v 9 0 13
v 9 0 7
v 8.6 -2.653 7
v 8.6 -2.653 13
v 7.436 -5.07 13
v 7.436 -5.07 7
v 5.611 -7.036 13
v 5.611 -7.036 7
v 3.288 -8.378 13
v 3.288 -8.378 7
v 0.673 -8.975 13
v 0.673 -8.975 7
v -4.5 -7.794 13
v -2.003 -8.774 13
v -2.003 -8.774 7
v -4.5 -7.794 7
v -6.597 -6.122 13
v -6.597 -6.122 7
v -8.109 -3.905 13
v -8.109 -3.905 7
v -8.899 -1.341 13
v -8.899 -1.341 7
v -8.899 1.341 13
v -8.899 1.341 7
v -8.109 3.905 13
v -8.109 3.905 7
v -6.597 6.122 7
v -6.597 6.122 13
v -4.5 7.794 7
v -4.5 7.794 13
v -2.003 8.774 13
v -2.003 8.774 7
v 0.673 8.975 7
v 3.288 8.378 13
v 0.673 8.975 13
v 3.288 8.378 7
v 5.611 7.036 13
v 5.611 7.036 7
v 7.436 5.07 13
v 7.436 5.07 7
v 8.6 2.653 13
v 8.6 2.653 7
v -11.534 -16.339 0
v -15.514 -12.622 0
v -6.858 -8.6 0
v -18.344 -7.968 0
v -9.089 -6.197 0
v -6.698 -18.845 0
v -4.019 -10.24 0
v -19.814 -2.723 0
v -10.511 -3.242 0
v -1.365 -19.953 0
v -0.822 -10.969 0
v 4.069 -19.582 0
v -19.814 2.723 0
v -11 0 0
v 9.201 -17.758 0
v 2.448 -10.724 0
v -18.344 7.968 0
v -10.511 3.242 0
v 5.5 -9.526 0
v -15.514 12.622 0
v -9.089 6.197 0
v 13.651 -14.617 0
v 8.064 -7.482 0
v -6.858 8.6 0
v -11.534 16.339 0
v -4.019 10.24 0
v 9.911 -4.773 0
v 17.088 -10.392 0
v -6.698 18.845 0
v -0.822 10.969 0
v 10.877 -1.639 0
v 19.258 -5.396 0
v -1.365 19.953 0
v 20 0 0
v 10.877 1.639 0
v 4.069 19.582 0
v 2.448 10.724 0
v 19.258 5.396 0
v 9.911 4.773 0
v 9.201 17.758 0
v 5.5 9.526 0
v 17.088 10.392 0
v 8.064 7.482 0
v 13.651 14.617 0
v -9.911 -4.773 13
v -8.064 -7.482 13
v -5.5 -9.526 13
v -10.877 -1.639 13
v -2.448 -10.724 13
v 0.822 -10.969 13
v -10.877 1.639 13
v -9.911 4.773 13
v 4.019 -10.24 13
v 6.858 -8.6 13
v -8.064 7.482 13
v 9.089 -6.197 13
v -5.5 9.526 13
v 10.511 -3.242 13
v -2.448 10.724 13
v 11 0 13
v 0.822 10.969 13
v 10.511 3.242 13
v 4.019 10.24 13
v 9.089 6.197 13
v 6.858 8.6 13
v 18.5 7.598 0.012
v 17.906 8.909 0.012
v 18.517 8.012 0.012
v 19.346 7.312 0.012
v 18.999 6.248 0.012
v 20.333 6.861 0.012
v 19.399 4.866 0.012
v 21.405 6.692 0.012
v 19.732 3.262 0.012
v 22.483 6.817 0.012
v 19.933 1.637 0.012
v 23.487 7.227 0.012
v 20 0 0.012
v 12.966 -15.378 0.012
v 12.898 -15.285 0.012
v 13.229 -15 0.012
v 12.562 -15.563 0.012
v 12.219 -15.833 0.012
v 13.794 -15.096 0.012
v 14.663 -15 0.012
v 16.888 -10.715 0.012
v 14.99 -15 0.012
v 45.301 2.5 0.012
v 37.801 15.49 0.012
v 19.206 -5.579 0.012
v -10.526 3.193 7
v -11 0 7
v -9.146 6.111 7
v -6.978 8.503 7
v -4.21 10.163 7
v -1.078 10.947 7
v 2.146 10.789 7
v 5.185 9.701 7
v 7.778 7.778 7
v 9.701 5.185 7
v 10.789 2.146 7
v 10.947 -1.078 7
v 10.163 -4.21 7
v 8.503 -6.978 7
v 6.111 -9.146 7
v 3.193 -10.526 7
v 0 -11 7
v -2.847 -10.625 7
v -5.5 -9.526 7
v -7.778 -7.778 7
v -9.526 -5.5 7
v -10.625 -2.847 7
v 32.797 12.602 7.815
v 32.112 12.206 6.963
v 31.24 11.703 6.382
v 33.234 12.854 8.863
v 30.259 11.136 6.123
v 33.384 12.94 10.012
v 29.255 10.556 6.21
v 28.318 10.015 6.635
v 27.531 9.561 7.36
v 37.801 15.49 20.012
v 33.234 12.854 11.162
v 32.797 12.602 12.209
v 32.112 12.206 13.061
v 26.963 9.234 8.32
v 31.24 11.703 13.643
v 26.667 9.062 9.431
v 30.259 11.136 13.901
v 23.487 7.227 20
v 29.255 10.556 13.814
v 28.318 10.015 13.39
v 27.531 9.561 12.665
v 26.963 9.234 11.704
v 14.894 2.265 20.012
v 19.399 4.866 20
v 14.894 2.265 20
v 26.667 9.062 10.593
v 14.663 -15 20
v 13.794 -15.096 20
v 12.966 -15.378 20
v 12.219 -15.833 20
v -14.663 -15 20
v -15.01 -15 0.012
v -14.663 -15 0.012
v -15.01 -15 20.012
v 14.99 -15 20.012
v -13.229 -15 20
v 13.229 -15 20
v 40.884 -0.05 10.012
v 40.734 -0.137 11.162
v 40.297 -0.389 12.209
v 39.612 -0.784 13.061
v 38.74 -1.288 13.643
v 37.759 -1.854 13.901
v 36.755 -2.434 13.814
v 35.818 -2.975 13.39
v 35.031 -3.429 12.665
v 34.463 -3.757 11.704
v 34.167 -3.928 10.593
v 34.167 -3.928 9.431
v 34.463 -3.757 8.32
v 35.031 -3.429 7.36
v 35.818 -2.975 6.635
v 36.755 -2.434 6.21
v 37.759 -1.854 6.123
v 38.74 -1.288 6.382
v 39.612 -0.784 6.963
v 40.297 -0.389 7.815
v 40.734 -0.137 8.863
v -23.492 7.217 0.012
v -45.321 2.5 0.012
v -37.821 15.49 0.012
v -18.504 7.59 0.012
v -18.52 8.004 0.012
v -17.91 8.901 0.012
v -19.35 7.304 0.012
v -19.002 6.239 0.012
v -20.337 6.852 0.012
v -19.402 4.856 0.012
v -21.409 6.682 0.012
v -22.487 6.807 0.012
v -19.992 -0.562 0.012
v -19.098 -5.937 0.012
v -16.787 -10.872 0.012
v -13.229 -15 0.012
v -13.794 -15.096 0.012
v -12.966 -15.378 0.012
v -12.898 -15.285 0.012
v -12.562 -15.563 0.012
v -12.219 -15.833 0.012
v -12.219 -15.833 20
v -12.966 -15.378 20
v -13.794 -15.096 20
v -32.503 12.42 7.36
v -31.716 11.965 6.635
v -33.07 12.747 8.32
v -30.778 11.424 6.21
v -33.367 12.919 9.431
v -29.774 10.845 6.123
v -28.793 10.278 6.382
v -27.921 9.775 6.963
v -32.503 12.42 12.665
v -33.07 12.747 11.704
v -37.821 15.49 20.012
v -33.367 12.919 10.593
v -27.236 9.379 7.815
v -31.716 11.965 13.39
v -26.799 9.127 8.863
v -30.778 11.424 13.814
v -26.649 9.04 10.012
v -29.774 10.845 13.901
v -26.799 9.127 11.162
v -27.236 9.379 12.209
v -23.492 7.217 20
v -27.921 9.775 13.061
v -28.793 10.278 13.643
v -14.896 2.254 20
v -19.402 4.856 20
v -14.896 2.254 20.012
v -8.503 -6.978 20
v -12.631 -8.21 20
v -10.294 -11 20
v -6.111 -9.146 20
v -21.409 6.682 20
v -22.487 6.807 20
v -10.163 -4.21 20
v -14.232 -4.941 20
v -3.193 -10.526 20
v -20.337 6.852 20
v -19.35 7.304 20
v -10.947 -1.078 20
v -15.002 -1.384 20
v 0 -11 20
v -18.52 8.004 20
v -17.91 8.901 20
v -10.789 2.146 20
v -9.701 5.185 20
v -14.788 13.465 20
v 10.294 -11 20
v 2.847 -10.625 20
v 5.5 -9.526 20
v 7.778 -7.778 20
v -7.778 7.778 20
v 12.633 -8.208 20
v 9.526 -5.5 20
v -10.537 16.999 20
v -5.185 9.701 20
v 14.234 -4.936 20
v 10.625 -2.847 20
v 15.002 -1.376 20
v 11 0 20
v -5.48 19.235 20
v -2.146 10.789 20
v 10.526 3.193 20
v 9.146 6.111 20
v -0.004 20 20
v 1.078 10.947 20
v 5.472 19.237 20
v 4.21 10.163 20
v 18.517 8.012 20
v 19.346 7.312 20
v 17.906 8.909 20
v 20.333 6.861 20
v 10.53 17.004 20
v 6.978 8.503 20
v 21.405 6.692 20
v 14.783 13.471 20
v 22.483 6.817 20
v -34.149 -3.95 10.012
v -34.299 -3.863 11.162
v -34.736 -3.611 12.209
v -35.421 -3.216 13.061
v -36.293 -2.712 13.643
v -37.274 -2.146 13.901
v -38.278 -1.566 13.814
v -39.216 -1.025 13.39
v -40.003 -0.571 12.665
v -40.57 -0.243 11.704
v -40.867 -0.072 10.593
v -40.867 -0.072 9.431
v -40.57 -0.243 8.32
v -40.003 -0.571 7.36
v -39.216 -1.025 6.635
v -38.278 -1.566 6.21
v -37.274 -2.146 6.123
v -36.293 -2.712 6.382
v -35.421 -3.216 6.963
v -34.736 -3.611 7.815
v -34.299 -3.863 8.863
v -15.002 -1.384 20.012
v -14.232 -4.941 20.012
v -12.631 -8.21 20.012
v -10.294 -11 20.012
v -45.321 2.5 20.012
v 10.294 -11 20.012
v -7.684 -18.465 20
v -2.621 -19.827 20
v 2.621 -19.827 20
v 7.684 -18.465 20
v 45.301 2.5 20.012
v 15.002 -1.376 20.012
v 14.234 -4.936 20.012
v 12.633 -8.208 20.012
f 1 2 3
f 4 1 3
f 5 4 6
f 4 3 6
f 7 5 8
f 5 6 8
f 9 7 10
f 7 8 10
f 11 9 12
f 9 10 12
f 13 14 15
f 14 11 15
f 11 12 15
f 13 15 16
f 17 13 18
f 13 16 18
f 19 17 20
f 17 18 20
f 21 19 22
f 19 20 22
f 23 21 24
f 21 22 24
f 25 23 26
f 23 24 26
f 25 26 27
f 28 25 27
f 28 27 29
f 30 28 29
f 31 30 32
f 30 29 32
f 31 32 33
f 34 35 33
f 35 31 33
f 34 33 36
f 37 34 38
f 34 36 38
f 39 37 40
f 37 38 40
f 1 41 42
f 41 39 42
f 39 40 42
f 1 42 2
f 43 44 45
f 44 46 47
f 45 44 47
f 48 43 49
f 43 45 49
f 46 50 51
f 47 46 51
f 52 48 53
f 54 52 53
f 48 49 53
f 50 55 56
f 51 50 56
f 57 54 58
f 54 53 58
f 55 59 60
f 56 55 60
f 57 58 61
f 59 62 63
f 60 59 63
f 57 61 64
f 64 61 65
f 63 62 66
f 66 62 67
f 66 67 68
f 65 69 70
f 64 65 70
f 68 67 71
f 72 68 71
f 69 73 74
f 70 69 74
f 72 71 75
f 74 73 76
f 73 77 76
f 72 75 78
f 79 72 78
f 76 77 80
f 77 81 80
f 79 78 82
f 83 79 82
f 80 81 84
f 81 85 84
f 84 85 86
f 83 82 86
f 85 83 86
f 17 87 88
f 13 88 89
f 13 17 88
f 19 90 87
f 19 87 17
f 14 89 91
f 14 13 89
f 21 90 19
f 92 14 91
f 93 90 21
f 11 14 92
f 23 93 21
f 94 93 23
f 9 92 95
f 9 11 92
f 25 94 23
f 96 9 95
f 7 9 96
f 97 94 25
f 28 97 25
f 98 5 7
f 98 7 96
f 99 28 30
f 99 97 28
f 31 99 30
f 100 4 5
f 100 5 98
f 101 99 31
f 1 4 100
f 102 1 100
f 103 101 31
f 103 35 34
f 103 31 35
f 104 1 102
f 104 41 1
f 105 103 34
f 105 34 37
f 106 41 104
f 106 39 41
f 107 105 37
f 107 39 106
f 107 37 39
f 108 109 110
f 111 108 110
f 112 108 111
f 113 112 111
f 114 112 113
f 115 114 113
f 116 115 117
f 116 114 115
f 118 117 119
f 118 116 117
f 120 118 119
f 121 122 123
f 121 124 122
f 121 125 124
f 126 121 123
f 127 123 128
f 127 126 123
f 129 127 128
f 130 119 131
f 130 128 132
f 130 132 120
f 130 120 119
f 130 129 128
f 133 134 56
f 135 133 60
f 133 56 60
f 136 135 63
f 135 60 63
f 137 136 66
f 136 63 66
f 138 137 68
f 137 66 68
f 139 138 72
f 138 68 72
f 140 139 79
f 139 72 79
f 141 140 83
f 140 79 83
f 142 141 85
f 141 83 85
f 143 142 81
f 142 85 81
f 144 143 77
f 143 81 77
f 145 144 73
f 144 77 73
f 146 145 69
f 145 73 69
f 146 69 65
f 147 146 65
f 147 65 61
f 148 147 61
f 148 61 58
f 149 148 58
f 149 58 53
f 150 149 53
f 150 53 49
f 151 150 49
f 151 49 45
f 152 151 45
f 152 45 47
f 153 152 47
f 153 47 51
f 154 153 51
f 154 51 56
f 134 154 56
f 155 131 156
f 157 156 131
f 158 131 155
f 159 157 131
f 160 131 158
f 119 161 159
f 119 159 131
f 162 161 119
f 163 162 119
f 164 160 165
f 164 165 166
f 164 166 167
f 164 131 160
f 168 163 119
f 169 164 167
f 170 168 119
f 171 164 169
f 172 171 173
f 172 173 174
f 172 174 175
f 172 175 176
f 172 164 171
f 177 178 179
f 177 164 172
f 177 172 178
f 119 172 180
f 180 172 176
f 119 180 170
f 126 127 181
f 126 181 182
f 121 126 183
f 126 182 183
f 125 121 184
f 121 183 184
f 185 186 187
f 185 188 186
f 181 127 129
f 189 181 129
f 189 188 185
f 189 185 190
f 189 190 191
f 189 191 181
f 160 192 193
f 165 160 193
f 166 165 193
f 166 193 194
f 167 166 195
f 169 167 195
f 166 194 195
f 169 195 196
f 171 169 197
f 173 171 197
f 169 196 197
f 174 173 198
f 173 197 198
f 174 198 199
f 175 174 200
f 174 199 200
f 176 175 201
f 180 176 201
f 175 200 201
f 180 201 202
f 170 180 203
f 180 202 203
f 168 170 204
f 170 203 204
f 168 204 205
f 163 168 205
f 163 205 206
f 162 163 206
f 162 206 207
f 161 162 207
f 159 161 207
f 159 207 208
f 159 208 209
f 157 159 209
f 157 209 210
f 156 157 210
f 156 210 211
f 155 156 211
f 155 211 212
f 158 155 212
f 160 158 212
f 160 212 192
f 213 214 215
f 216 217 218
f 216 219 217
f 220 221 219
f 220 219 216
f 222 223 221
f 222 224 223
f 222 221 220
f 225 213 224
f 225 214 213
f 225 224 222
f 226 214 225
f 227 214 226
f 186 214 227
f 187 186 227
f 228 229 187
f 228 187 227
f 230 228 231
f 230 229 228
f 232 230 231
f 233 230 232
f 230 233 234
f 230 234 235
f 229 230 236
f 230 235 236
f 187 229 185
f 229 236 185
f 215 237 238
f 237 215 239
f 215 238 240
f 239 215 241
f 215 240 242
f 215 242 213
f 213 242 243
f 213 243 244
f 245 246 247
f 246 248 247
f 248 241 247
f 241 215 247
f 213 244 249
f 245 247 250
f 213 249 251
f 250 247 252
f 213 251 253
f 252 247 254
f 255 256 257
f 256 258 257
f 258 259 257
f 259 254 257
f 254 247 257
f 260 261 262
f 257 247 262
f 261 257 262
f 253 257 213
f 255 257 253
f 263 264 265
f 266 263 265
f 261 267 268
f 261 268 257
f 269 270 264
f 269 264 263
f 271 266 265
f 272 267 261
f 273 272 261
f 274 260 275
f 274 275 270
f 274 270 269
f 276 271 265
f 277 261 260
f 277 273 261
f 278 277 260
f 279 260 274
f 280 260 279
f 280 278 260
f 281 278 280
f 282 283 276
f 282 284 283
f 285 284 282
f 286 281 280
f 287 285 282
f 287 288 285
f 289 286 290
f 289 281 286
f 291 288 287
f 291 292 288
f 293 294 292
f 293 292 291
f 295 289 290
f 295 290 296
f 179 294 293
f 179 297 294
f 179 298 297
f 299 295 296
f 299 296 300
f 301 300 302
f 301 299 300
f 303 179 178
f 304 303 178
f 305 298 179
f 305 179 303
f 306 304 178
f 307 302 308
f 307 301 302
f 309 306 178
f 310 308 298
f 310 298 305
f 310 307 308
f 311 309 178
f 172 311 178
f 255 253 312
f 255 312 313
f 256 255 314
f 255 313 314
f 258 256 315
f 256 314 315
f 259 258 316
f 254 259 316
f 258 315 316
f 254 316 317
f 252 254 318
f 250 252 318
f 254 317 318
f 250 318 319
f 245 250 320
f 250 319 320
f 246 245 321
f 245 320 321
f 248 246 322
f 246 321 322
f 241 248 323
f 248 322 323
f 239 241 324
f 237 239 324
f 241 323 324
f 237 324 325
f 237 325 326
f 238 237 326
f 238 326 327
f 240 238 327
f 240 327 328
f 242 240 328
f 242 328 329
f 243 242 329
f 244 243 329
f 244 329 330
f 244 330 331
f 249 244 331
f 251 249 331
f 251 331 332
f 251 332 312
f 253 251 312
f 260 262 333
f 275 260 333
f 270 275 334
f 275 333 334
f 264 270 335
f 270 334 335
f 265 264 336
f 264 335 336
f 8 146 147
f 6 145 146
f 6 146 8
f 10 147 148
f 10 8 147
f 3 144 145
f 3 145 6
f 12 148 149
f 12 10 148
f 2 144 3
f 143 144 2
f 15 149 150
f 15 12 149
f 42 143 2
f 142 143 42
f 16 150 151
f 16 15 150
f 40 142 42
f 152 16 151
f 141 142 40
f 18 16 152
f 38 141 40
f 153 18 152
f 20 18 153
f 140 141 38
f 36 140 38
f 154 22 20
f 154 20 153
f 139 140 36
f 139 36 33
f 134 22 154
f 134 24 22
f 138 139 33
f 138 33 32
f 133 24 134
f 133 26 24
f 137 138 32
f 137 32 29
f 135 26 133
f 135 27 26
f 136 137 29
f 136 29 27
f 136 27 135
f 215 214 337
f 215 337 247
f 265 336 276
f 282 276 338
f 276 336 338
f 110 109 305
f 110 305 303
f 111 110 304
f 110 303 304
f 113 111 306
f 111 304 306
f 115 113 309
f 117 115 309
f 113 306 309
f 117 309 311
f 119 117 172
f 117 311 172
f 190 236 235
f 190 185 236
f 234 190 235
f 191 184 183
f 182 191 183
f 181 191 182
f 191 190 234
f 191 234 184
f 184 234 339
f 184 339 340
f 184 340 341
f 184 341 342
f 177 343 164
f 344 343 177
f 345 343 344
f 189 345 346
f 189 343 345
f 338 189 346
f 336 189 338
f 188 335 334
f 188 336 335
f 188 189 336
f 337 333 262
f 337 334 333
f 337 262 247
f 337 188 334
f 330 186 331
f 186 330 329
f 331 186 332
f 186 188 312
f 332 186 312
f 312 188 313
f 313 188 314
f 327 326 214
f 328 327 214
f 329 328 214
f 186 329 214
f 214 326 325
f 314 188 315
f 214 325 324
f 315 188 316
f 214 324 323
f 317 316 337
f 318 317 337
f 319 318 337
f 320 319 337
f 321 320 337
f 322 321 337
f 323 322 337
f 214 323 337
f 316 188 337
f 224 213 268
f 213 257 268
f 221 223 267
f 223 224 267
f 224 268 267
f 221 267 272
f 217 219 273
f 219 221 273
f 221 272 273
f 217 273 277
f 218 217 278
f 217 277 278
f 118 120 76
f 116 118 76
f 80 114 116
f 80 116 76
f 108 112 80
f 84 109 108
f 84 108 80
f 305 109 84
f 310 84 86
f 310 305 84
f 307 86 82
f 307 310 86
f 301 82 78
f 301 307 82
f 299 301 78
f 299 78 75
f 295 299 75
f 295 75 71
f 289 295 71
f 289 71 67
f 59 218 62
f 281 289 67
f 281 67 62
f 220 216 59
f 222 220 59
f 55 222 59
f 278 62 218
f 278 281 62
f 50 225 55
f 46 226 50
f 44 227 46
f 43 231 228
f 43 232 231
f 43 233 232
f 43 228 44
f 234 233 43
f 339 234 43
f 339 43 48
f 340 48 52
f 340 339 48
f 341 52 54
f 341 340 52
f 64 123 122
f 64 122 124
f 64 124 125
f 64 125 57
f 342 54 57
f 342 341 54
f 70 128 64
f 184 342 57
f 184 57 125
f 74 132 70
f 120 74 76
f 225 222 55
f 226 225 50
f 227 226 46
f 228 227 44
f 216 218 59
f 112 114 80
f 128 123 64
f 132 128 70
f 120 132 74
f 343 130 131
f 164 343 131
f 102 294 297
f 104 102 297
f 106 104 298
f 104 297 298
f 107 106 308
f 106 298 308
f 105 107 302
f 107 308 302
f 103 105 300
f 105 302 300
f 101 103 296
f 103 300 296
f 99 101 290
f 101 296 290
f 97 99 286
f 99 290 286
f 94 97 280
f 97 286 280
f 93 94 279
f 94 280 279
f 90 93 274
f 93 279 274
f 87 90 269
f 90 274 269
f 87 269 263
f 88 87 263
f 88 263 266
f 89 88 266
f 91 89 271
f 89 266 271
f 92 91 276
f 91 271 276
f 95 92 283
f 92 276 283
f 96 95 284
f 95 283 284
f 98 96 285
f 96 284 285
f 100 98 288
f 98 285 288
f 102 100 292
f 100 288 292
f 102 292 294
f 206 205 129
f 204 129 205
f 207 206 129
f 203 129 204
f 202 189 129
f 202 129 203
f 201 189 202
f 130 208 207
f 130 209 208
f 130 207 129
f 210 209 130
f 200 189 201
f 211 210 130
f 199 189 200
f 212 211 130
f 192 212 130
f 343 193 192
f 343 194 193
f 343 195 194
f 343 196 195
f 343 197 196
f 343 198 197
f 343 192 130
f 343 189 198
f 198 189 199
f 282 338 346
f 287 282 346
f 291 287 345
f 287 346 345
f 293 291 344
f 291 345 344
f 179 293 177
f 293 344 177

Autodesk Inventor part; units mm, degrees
ref_plane "YZ Plane" through (0, 0, 0) normal (1, 0, 0) x (0, 1, 0)
ref_plane "XZ Plane" through (0, 0, 0) normal (0, 1, 0) x (-1, 0, 0)
sketch "Sketch1" plane through (0, 0, 0) normal (0, 0, 1) x (1, 0, 0)
  circle A0 centre (0, 0) radius 9
  circle A1 centre (0, 0) radius 15
  dimension "d0" = 18
  dimension "d3" = 30
extrude "Extrusion1" add sketch "Sketch1" along normal blind 20
sketch "Sketch2" plane through (0, 0, 20) normal (0, 0, 1) x (1, 0, 0)
  circle A0 centre (0, 0) radius 9 projected
  circle A1 centre (0, 0) radius 15 projected
  circle A2 centre (0, 0) radius 11
  dimension "d6" = 22
extrude "Extrusion2" cut sketch "Sketch2" against normal blind 7 contours A2
sketch "Sketch3" plane through (0, 0, 0) normal (0, 0, -1) x (-1, 0, 0)
  circle A0 centre (0, 0) radius 9 projected
  circle A1 centre (0, 0) radius 15 projected
  circle A2 centre (0, 0) radius 11
  dimension "d10" = 22
extrude "Extrusion3" cut sketch "Sketch3" against normal blind 7 contours A2
sketch "Sketch4" plane through (0, 0, 20) normal (0, 0, 1) x (1, 0, 0)
  circle A0 centre (0, 0) radius 11 projected
  circle A1 centre (0, 0) radius 15 projected
  line L0 (-15, 0) -> (15, 0)
ref_plane "Work Plane2" through (-15, -15, 20) normal (0, -1, 0) x (1, 0, 0)
ref_plane "Work Plane1" through (-15, 0, 20) normal (0, -1, 0) x (1, 0, 0)
sketch "Sketch5" plane through (-15, -15, 20) normal (0, -1, 0) x (1, 0, 0)
  line L0 (-0.0102, -19.9878) -> (29.9898, -19.9878)
  line L1 (29.9898, -19.9878) -> (29.9898, 0.0122)
  line L2 (29.9898, 0.0122) -> (-0.0102, 0.0122)
  line L3 (-0.0102, 0.0122) -> (-0.0102, -19.9878)
  point P0 (15, -20)
  dimension "d16" = 20
  dimension "d18" = 30
extrude "Extrusion4" add sketch "Sketch5" against normal blind 4
sketch "Sketch6" plane through (-15.0102, -15, 20.0122) normal (0, 0, 1) x (1, 0, 0)
  line L0 (30, 0) -> (0, 0) projected
  line L1 (30, 0) -> (30, 4) projected
  line L2 (0, 4) -> (30, 4) projected
  line L3 (0, 0) -> (0, 4) projected
  line L4 (0, 0) -> (-30.3109, 17.5)
  line L5 (30, 0) -> (60.3109, 17.5)
  line L6 (-30.3109, 17.5) -> (-22.8109, 30.4904)
  line L7 (-22.8109, 30.4904) -> (0.1146, 17.2544)
  line L8 (60.3109, 17.5) -> (52.8109, 30.4904)
  line L9 (52.8109, 30.4904) -> (29.8854, 17.2544)
  arc A0 (0.1146, 17.2544) -> (4.7165, 4) centre (15.0102, 15) ccw
  line L10 (0, 0) -> (15.0157, -0.0652)
  line L11 (30, 0) -> (16.4105, 0)
  arc A1 (25.3039, 4) -> (29.9041, 17.2652) centre (15.0102, 15) ccw
  arc A2 (16.4105, 0) -> (25.3039, 4) centre (15.0102, 15) ccw
  arc A3 (13.6098, 0) -> (16.4105, 0) centre (15.0102, 15) ccw
  arc A4 (4.7165, 4) -> (13.6098, 0) centre (15.0102, 15) ccw
  circle A5 centre (15.0102, 15) radius 15.0652
  dimension "d40" = 30.1304
  dimension "d21" = 30
  dimension "d22" = 30
  dimension "d23" = 35
  dimension "d24" = 35
  dimension "d25" = 90
  dimension "d26" = 90
  dimension "d27" = 15
extrude "Extrusion5" add sketch "Sketch6" against normal blind 20 contours L1 L2 A1 L9 L8 L5 | L4 L6 L7 A0 L2 L3
sketch "Sketch7" plane through (-45.3211, 2.5, 0.0122) normal (-0.5, -0.866, 0) x (0.866, -0.5, 0)
  circle A0 centre (9, 10) radius 3.9
  line L0 (0, 20) -> (0, 0) projected
  point P0 (40.4992, -0.0122)
  dimension "d30" = 7.8
  dimension "d39" = 9
extrude "Extrusion6" cut sketch "Sketch7" against normal blind 20
sketch "Sketch8" plane through (14.9898, -15, 0.0122) normal (0.5, -0.866, 0) x (0.866, 0.5, 0)
  line L0 (35, 20) -> (35, 0) projected
  circle A0 centre (26, 10) radius 3.9
  point P0 (-5.4816, -0.0122)
  dimension "d34" = 7.8
  dimension "d36" = 9
extrude "Extrusion7" cut sketch "Sketch8" against normal blind 20
sketch "Sketch9" plane through (0, 0, 20) normal (0, 0, 1) x (1, 0, 0)
  circle A0 centre (0, 0) radius 11 projected
  arc A1 (10.198, -11) -> (-10.198, -11) centre (0, 0) ccw projected
  circle A2 centre (0, 0) radius 20
  dimension "d41" = 40
extrude "Extrusion8" add sketch "Sketch9" against normal blind 20
fillet "Fillet1" radius 4 2 edges at (-13.2288, -15, 10.0061) (13.2288, -15, 10.0061)
fillet "Fillet2" radius 4 2 edges at (-19.4016, 4.8559, 10.0061) (19.399, 4.8661, 10.0061)
properties part number "right top"
